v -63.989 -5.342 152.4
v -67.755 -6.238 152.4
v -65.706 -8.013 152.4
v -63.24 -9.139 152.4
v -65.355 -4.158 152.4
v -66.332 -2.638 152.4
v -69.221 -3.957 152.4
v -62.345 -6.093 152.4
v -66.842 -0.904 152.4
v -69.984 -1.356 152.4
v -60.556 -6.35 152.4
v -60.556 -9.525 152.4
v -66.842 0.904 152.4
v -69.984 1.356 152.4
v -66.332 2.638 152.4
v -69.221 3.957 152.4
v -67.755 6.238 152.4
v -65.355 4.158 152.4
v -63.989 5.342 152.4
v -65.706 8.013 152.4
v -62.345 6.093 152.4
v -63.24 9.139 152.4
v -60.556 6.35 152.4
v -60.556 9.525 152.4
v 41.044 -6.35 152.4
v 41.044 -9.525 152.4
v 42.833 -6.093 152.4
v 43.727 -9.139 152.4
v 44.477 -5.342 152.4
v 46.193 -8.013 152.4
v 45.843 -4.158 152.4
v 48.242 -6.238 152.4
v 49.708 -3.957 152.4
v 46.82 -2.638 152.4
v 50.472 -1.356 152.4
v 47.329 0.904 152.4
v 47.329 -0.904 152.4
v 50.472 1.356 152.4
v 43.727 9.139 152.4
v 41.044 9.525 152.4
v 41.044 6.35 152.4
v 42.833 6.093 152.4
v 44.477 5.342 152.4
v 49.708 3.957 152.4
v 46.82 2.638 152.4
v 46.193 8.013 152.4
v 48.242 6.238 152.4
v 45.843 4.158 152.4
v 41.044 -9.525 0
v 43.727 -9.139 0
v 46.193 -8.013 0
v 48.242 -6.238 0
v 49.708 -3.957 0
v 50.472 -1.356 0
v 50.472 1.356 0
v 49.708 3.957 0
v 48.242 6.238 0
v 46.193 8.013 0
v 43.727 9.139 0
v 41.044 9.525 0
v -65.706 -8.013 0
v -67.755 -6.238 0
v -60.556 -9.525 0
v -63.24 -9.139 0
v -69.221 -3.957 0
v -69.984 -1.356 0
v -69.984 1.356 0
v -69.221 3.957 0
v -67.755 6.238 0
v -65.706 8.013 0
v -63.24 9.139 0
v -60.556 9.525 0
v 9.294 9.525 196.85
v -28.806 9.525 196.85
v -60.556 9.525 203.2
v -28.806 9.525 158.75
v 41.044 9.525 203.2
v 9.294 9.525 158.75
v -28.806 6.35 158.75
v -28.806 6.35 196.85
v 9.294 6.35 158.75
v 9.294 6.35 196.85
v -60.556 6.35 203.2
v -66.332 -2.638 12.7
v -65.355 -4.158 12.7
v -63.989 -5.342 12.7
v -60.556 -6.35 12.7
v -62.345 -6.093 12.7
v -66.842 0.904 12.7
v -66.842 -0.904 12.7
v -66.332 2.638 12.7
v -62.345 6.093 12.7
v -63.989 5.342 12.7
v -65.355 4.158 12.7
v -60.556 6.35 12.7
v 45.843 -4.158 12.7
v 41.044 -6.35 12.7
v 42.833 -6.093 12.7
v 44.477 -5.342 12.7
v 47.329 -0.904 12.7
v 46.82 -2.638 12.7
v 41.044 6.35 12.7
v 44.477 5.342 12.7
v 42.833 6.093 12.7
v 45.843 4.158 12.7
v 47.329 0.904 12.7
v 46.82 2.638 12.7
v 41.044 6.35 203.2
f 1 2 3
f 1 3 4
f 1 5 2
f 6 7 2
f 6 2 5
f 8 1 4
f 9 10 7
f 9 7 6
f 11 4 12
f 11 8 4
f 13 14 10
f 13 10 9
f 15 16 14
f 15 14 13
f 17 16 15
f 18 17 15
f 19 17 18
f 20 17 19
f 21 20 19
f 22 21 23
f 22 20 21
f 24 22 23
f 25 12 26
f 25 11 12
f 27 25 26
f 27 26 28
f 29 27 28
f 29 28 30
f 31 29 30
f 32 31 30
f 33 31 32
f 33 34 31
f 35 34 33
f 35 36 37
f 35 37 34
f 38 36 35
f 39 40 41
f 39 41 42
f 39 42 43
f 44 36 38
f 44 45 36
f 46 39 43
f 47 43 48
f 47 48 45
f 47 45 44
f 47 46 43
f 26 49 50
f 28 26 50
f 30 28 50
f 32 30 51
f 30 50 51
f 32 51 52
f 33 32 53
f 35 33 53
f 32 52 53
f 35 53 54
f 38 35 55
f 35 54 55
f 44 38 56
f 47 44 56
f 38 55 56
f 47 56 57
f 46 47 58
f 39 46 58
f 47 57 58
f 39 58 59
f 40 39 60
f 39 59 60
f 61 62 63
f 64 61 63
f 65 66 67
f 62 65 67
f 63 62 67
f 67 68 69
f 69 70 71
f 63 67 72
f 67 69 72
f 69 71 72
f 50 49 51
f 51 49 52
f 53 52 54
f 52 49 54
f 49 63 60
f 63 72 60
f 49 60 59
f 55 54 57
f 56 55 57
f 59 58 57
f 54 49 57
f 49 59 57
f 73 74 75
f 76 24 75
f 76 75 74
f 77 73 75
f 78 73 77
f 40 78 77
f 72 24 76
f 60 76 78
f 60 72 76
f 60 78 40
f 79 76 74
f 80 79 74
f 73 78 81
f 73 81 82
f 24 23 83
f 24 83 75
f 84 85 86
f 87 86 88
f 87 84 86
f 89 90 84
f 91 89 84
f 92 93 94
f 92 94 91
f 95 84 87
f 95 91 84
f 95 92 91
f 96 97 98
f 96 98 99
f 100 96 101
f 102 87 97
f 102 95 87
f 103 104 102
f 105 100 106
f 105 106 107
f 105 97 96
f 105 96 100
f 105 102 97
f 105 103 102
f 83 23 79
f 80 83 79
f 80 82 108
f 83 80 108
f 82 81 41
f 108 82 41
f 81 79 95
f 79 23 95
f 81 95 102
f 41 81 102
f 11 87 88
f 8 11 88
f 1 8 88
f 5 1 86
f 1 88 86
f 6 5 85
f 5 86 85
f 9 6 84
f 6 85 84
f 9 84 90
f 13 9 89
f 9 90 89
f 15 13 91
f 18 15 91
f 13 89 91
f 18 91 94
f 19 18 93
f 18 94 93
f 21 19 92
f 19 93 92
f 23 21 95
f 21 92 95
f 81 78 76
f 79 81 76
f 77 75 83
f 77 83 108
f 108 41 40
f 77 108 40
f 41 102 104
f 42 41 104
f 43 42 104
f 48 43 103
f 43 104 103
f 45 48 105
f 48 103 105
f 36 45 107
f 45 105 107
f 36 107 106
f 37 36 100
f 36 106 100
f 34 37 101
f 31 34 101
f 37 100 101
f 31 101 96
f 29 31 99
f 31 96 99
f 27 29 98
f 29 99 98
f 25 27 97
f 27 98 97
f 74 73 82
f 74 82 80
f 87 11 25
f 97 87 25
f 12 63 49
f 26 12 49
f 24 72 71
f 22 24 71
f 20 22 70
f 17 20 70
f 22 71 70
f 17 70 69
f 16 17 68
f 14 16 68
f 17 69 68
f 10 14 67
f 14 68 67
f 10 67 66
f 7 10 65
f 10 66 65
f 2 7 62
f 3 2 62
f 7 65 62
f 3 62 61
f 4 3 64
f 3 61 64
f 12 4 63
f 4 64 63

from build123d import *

# Parameters (mm, degrees)
F1_DEPTH = 12.7
F0_W     = 101.6
F0_H     = 3.175
F2_DEPTH = 152.4
F3_DEPTH = 50.8
F4_W     = 101.6
F4_H     = 3.175
F5_DEPTH = 50.8
F6_W     = 38.1
F6_H     = 38.1
F7_DEPTH = 25.4


with BuildPart() as f1:
    # F0 (on Top) → F1 (new body)
    with BuildSketch(Plane.XY):
        with BuildLine():
            Line((41.043708, 6.35), (-60.556292, 6.35))
            ThreePointArc((-60.556292, 6.35), (-66.906292, 0), (-60.556292, -6.35))
            Line((-60.556292, -6.35), (41.043708, -6.35))
            ThreePointArc((41.043708, -6.35), (47.393708, 0), (41.043708, 6.35))
        make_face()
    extrude(amount=F1_DEPTH)

    # F0 (on Top) → F2 (join)
    with BuildSketch(Plane.XY):
        with BuildLine():
            ThreePointArc((-60.556292, -6.35), (-66.906292, 0), (-60.556292, 6.35))
            Line((-60.556292, 6.35), (41.043708, 6.35))
            ThreePointArc((41.043708, 6.35), (47.393708, 0), (41.043708, -6.35))
            Line((41.043708, -6.35), (41.043708, -9.525))
            ThreePointArc((41.043708, -9.525), (50.568708, 0), (41.043708, 9.525))
            Line((41.043708, 9.525), (-60.556292, 9.525))
            ThreePointArc((-60.556292, 9.525), (-70.081292, 0), (-60.556292, -9.525))
            Line((-60.556292, -9.525), (-60.556292, -6.35))
        make_face()
        with Locations((-9.756292, -7.9375)):
            Rectangle(F0_W, F0_H)
    extrude(amount=F2_DEPTH)

    # F0 (on Top) → F3 (join)
    with BuildSketch(Plane.XY):
        with Locations((-9.756292, -7.9375)):
            Rectangle(F0_W, F0_H)
    extrude(amount=F3_DEPTH)

    # F4 (on face) → F5 (join)
    with BuildSketch(Plane.XY.offset(152.4)):
        with Locations((-9.756292, 7.9375)):
            Rectangle(F4_W, F4_H)
    extrude(amount=F5_DEPTH)

    # F6 (on face) → F7 (cut)
    with BuildSketch(Plane(origin=(0, 9.525, 0), x_dir=(-1, 0, 0), z_dir=(0, 1, 0))):
        with Locations((9.756292, 177.8)):
            Rectangle(F6_W, F6_H)
    extrude(amount=-F7_DEPTH, mode=Mode.SUBTRACT)


solid = f1.part
